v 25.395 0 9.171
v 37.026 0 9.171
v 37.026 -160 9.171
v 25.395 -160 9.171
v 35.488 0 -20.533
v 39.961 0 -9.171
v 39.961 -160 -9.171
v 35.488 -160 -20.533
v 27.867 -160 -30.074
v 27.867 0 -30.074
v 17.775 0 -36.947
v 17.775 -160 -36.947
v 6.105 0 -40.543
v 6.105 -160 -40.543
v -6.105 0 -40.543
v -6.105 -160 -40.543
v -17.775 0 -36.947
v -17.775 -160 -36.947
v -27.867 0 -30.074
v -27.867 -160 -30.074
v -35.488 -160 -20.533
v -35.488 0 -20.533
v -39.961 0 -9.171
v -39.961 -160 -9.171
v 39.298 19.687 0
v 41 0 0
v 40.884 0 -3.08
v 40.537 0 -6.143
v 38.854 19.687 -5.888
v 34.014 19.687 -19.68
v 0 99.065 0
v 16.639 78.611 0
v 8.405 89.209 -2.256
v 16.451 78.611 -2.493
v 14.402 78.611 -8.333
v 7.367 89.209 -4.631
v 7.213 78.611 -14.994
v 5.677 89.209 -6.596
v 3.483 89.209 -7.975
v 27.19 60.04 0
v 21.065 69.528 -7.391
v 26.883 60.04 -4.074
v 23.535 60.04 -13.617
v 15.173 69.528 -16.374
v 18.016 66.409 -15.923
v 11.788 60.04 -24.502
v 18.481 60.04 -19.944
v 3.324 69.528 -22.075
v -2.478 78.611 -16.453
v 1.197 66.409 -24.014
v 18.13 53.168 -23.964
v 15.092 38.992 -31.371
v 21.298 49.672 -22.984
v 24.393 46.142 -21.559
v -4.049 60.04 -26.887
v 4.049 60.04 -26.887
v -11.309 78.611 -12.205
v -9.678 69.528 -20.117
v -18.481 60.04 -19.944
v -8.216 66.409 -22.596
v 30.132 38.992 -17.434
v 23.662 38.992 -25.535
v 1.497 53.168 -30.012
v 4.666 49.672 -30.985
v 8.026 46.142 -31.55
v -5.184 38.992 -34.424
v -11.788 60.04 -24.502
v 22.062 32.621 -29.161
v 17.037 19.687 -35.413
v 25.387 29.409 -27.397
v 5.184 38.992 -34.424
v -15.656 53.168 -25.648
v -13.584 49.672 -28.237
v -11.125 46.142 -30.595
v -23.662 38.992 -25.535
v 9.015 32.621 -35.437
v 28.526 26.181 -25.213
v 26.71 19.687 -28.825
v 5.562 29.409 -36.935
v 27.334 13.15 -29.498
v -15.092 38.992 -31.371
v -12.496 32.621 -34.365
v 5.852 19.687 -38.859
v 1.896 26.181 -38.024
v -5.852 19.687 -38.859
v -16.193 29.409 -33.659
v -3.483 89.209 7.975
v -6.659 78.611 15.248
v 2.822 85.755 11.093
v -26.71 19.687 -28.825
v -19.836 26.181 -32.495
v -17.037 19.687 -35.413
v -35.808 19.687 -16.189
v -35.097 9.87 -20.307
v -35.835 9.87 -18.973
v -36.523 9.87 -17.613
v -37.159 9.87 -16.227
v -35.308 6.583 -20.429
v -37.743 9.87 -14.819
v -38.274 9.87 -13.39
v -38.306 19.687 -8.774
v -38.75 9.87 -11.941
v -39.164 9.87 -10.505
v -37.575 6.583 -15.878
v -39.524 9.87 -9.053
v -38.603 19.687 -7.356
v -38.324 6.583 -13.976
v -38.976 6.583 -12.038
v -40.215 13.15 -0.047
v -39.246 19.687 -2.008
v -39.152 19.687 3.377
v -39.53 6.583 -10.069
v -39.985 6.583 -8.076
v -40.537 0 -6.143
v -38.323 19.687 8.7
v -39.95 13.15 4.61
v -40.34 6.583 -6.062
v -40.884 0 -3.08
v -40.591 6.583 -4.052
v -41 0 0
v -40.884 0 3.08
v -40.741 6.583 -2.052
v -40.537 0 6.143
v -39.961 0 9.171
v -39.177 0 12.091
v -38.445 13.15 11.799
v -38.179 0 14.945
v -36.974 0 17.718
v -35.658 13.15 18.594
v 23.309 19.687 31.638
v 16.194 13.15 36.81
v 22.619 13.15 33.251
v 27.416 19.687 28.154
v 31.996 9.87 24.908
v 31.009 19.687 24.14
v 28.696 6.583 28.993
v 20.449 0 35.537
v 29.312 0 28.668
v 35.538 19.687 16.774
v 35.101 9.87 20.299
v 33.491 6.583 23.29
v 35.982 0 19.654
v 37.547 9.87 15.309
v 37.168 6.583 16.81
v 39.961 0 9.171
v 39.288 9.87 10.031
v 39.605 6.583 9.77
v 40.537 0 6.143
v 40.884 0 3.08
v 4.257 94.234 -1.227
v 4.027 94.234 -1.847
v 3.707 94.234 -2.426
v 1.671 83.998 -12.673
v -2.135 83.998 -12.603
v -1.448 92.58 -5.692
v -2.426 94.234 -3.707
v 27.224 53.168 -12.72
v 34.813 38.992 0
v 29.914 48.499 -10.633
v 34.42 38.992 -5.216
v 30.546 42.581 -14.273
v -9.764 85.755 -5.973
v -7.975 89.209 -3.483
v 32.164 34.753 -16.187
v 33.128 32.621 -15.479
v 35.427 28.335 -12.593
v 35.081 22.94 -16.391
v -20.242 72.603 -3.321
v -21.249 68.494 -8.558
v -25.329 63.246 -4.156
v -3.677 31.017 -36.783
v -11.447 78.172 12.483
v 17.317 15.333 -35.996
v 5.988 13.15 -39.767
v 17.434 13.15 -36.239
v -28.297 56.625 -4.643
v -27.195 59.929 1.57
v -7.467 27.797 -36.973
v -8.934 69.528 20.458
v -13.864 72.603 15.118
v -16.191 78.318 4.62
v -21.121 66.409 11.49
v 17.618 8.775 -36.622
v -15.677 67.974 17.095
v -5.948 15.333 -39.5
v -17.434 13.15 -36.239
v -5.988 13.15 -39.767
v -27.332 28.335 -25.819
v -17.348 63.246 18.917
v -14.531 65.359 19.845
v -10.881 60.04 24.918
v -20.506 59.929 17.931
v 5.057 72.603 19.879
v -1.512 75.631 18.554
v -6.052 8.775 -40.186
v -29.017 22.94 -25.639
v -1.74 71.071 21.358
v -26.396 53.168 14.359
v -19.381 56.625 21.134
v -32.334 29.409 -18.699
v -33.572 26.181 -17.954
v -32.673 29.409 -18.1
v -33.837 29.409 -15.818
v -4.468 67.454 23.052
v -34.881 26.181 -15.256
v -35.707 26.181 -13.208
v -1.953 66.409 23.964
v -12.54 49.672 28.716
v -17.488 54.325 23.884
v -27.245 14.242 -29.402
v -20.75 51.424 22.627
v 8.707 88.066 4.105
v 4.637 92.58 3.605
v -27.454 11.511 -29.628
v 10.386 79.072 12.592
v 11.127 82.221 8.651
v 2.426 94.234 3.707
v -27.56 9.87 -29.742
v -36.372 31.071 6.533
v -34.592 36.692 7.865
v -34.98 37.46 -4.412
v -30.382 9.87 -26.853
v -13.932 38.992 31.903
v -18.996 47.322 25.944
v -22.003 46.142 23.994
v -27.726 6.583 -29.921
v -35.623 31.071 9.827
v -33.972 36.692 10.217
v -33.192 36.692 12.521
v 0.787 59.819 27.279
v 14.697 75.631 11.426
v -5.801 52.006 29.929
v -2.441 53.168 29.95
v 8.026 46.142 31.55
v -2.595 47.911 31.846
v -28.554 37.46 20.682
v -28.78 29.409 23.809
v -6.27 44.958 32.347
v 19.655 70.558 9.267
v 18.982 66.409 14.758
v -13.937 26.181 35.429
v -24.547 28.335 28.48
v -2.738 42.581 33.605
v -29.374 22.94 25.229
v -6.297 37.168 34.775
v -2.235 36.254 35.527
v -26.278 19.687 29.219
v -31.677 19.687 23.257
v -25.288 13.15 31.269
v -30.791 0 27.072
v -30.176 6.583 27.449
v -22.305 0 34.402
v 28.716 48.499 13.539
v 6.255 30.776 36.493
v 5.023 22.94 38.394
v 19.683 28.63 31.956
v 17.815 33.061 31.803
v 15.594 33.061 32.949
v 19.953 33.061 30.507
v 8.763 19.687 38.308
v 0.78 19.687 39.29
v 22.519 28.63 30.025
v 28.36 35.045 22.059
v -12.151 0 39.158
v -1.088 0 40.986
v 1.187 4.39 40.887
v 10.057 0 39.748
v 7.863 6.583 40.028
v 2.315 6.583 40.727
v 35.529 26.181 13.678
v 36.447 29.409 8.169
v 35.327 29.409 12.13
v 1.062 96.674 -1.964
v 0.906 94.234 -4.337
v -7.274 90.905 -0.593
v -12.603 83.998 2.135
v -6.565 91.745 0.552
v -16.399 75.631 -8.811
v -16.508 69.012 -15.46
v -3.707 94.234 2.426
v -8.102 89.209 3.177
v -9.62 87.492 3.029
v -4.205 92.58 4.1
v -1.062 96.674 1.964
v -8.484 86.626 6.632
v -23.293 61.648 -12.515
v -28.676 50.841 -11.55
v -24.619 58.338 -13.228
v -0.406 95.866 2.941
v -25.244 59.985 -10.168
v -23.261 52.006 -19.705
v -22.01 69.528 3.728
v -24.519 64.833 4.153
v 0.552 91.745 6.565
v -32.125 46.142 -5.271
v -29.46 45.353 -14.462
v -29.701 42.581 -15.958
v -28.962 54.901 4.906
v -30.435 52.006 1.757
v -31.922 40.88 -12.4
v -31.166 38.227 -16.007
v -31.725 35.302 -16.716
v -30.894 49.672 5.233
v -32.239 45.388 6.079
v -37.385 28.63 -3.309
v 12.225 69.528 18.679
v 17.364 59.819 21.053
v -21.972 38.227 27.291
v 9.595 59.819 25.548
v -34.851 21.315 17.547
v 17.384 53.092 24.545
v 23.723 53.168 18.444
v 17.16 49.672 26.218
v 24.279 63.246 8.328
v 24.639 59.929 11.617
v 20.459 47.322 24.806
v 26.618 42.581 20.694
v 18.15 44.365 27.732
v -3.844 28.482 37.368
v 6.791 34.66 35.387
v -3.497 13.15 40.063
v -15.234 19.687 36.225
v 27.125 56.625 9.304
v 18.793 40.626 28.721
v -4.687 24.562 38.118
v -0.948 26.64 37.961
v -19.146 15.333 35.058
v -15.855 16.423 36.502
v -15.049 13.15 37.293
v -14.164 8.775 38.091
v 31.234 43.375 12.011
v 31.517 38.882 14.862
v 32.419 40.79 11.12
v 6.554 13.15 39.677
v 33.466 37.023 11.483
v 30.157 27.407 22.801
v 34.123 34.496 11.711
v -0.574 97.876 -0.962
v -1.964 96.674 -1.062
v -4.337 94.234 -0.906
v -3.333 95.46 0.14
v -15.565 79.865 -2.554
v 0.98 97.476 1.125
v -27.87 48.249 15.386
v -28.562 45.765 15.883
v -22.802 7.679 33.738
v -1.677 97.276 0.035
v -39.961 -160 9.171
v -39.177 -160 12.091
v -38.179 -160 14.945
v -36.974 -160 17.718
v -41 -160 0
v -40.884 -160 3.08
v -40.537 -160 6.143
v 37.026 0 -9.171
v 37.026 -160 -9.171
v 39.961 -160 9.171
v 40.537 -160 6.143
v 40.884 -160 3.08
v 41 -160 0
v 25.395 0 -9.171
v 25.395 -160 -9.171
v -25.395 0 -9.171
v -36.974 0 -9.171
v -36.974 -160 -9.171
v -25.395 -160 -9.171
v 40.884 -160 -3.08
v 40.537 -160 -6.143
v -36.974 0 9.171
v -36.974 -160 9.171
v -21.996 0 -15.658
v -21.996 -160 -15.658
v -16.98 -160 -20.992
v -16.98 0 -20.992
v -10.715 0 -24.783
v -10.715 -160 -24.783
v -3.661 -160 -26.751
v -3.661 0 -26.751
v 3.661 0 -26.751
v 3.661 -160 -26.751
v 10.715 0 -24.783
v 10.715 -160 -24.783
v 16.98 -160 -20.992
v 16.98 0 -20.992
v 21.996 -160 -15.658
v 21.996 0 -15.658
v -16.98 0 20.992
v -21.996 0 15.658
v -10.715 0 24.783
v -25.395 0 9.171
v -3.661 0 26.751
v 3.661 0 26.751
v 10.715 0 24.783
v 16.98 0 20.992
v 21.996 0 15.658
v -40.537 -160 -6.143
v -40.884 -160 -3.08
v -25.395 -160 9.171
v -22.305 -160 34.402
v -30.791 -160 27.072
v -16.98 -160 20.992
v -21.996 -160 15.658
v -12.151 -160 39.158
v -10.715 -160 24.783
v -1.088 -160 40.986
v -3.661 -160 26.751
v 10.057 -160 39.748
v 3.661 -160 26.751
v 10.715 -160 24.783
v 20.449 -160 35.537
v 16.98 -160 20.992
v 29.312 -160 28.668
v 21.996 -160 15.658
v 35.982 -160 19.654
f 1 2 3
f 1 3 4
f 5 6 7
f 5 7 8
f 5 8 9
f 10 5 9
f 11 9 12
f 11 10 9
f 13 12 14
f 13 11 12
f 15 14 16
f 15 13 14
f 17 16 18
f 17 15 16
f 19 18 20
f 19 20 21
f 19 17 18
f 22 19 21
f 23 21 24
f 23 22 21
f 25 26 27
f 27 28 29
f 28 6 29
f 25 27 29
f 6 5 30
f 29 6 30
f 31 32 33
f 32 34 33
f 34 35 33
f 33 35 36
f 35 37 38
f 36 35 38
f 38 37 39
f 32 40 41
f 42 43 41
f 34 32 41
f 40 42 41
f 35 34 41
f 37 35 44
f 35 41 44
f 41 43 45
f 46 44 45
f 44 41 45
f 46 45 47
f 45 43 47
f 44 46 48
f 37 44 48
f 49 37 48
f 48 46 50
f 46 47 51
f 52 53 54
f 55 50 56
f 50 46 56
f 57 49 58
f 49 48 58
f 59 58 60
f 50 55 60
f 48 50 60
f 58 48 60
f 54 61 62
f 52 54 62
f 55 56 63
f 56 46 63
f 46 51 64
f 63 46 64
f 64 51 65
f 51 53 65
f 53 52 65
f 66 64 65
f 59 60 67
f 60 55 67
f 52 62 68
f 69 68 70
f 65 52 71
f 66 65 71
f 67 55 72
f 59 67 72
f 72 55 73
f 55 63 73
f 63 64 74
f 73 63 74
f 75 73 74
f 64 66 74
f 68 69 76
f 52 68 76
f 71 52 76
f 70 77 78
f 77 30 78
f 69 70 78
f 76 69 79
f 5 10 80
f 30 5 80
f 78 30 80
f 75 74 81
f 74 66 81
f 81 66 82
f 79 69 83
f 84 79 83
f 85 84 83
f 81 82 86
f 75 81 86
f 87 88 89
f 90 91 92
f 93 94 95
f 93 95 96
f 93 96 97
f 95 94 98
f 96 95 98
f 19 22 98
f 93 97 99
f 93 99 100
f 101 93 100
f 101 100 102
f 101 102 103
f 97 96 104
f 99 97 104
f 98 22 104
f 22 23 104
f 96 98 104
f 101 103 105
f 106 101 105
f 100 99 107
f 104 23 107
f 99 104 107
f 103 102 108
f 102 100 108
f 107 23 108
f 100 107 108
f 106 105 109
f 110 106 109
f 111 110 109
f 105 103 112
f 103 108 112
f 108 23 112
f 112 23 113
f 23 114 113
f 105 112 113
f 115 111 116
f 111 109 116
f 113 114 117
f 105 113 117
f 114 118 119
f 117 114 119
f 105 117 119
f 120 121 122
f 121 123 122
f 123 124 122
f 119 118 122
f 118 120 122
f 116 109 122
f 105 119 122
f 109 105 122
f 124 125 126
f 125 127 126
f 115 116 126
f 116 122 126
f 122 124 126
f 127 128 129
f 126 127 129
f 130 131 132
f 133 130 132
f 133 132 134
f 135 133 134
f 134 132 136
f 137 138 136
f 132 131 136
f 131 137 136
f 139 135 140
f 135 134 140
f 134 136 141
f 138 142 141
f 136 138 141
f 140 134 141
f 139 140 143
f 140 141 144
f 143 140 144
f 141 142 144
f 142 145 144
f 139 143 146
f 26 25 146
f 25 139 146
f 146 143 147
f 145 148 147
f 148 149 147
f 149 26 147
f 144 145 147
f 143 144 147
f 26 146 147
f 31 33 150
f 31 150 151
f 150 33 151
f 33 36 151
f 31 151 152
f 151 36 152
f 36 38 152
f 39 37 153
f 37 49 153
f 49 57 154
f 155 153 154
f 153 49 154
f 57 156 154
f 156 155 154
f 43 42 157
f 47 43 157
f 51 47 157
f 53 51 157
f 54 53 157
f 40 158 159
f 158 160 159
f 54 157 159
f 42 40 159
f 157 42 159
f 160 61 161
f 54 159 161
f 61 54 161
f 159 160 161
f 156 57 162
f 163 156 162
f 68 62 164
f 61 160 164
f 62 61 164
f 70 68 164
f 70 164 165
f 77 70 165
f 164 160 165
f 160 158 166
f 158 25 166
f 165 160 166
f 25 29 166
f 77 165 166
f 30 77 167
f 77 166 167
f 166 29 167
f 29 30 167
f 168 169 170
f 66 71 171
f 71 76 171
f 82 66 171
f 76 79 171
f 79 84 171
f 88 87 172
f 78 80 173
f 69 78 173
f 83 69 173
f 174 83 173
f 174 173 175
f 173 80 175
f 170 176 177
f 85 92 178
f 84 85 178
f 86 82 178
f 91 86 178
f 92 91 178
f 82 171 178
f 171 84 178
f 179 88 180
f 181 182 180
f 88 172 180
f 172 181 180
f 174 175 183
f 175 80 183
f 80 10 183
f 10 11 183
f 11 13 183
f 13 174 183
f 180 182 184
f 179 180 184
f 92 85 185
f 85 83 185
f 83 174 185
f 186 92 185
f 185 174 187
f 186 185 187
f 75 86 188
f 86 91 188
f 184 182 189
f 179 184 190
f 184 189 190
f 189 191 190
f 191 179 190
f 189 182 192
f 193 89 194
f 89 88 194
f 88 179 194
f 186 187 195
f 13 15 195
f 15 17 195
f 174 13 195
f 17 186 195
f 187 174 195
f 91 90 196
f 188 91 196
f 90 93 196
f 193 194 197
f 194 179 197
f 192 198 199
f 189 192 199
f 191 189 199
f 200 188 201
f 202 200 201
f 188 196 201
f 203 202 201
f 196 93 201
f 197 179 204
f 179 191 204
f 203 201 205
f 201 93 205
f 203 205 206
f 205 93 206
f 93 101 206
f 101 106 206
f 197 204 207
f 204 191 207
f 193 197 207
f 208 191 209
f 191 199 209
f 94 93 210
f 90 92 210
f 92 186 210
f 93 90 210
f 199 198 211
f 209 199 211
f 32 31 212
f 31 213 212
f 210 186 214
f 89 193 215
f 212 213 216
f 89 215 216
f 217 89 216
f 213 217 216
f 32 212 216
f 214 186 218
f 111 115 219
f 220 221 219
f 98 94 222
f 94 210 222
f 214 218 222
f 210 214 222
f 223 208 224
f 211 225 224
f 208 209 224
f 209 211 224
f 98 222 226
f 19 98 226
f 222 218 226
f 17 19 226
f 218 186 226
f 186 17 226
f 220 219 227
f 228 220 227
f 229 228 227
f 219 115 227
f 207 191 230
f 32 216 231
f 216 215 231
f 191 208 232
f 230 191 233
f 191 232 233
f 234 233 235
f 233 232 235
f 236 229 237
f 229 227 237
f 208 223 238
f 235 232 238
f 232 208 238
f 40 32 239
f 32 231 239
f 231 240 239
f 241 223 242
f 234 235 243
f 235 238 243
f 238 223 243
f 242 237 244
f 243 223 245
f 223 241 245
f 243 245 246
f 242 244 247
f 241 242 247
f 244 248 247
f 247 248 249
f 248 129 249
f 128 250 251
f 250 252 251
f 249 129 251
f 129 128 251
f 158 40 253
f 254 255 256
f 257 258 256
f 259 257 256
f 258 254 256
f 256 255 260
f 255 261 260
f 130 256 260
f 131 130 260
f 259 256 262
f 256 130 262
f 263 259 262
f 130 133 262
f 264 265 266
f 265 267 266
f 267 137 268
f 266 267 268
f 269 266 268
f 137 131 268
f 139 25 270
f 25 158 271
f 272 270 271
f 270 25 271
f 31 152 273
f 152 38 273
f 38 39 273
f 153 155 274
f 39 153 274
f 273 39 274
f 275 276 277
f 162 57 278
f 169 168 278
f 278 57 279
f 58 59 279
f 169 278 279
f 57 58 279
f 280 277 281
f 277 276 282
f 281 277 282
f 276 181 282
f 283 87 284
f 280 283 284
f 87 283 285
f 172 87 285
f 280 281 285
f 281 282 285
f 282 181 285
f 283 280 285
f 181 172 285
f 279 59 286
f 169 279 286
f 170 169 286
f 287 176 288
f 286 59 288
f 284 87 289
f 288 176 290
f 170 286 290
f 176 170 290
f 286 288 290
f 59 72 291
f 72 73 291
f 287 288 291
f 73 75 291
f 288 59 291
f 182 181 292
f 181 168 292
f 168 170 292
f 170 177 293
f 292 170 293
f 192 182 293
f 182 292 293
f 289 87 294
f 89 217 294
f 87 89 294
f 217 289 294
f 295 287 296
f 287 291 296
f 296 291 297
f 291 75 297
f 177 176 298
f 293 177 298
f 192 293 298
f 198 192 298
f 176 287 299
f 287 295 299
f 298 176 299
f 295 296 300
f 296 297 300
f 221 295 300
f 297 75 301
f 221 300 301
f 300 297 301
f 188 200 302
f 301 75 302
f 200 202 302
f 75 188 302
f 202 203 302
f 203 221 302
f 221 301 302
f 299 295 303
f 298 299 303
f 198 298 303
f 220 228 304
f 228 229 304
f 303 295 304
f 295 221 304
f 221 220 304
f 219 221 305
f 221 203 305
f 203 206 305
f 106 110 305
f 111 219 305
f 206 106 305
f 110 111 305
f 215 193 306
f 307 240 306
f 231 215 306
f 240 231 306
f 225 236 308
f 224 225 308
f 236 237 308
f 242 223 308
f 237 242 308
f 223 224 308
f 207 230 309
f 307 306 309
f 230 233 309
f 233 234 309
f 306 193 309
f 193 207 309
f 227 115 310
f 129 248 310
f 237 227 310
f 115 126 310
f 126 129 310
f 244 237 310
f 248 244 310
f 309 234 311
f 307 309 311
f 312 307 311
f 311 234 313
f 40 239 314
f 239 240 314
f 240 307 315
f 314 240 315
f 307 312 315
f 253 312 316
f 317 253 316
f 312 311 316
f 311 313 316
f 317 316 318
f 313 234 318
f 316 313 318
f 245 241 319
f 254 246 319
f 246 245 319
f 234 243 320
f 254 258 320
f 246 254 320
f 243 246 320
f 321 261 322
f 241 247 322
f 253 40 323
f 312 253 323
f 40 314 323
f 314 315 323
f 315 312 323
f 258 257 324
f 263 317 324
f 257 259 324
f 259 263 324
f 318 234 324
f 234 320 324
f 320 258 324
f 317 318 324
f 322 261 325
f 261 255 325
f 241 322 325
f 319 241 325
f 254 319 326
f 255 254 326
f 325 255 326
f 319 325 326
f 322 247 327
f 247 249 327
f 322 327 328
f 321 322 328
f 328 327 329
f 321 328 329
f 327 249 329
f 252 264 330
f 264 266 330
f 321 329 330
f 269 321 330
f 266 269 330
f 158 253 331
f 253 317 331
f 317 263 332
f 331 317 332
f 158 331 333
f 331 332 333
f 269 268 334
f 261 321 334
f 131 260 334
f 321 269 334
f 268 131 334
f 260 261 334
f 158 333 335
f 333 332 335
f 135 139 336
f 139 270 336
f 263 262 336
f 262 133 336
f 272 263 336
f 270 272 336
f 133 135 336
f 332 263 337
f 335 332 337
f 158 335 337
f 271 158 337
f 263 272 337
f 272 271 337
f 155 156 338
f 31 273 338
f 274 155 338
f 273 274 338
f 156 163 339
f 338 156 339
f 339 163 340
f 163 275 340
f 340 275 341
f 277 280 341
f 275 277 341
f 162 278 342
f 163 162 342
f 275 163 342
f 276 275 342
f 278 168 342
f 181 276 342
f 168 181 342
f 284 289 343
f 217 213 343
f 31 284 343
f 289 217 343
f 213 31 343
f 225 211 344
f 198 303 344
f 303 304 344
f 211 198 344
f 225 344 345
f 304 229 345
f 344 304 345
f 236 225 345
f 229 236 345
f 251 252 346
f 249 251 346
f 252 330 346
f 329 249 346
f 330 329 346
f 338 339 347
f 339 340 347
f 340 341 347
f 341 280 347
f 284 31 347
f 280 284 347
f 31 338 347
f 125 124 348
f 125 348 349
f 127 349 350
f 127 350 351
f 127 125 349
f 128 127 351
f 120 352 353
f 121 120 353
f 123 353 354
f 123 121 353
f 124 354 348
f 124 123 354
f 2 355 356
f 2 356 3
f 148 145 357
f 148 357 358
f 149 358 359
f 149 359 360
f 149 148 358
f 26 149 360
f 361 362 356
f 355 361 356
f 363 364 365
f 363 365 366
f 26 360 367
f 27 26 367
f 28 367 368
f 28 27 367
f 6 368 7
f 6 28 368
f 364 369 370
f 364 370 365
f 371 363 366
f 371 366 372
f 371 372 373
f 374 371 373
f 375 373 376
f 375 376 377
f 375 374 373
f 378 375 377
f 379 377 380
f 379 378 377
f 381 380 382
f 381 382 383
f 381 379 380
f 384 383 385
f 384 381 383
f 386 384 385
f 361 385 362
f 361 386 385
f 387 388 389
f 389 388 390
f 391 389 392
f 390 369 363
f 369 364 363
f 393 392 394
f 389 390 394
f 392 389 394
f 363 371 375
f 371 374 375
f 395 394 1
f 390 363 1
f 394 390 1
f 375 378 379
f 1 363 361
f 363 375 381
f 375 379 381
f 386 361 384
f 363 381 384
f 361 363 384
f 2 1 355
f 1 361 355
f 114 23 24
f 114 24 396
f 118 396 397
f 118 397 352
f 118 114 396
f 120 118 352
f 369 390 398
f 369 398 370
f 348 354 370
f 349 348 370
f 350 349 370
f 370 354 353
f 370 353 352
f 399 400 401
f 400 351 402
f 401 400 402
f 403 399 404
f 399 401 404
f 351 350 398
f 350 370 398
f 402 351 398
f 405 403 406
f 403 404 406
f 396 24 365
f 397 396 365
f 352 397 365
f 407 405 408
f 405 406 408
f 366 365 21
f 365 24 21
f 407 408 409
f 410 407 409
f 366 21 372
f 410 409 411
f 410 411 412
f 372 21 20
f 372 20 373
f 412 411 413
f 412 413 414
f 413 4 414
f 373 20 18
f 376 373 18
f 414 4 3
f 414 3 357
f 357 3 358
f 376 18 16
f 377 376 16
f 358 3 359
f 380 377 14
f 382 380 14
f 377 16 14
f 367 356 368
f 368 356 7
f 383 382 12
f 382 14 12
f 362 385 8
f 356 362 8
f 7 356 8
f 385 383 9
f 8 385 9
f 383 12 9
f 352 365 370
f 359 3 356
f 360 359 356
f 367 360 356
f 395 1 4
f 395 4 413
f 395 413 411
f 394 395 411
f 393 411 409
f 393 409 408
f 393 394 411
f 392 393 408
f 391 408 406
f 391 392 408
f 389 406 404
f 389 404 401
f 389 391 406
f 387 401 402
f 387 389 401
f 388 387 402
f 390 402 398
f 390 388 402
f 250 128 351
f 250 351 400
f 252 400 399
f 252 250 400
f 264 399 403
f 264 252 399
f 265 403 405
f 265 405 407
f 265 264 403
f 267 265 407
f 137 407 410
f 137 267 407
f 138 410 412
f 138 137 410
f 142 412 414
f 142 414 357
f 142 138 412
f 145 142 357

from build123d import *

# Parameters (mm, degrees)
BOSS_EXTRUDE1_DEPTH = 160


with BuildPart() as part:
    # Sketch1 → Boss-Extrude1 (new body)
    with BuildSketch(Plane(origin=(0, 0, 0), x_dir=(1, 0, 0), z_dir=(0, 1, 0))):
        with BuildLine():
            ThreePointArc((41, 0), (40.739454279, 4.61485266), (39.961128533, 9.171052632))
            Line((39.961128533, 9.171052632), (37.026014985, 9.171052632))
            Line((37.026014985, 9.171052632), (37.026014985, 0))
            Line((37.026014985, 0), (41, 0))
        make_face()
        with BuildLine():
            ThreePointArc((39.961128533, -9.171052632), (40.739454279, -4.61485266), (41, 0))
            Line((41, 0), (37.026014985, 0))
            Line((37.026014985, 0), (37.026014985, -9.171052632))
            Line((37.026014985, -9.171052632), (39.961128533, -9.171052632))
        make_face()
        with BuildLine():
            Line((-36.973985015, 0), (-41, 0))
            ThreePointArc((-41, 0), (-40.739454279, -4.61485266), (-39.961128533, -9.171052632))
            Line((-39.961128533, -9.171052632), (-36.973985015, -9.171052632))
            Line((-36.973985015, -9.171052632), (-36.973985015, 0))
        make_face()
        with BuildLine():
            Line((-25.394719798, -9.171052632), (-36.973985015, -9.171052632))
            Line((-36.973985015, -9.171052632), (-36.973985015, -17.717912748))
            ThreePointArc((-36.973985015, -17.717912748), (4.526915182, -40.74931949), (39.961128533, -9.171052632))
            Line((39.961128533, -9.171052632), (37.026014985, -9.171052632))
            Line((37.026014985, -9.171052632), (25.394719798, -9.171052632))
            ThreePointArc((25.394719798, -9.171052632), (0, -27), (-25.394719798, -9.171052632))
        make_face()
        with BuildLine():
            Line((-36.973985015, 9.171052632), (-39.961128533, 9.171052632))
            ThreePointArc((-39.961128533, 9.171052632), (-40.739454279, 4.61485266), (-41, 0))
            Line((-41, 0), (-36.973985015, 0))
            Line((-36.973985015, 0), (-36.973985015, 9.171052632))
        make_face()
        with BuildLine():
            ThreePointArc((39.961128533, 9.171052632), (0, 41), (-39.961128533, 9.171052632))
            Line((-39.961128533, 9.171052632), (-36.973985015, 9.171052632))
            Line((-36.973985015, 9.171052632), (-25.394719798, 9.171052632))
            ThreePointArc((-25.394719798, 9.171052632), (0, 27), (25.394719798, 9.171052632))
            Line((25.394719798, 9.171052632), (37.026014985, 9.171052632))
            Line((37.026014985, 9.171052632), (39.961128533, 9.171052632))
        make_face()
        with BuildLine():
            Line((-36.973985015, -9.171052632), (-39.961128533, -9.171052632))
            ThreePointArc((-39.961128533, -9.171052632), (-38.7042004, -13.527190078), (-36.973985015, -17.717912748))
            Line((-36.973985015, -17.717912748), (-36.973985015, -9.171052632))
        make_face()
    extrude(amount=-BOSS_EXTRUDE1_DEPTH)

    # Sketch2 → Revolve1 (revolve)
    with BuildSketch(Plane.XY):
        with BuildLine():
            Line((0, 0), (0, 99.064623465))
            add(Edge.make_bspline(
                [(0, 99.064623465), (11.435717322, 87.036046157), (23.647174069, 70.328206009), (36.388082529, 36.329625432), (40.969226805, 16.559428814), (41, 0)],
                knots=[0, 0, 0, 0, 0.458505426, 0.547537698, 1, 1, 1, 1], degree=3))
            Line((41, 0), (0, 0))
        make_face()
    revolve(axis=Axis((0, 0, 0), (0, 1, 0)))


solid = part.part
